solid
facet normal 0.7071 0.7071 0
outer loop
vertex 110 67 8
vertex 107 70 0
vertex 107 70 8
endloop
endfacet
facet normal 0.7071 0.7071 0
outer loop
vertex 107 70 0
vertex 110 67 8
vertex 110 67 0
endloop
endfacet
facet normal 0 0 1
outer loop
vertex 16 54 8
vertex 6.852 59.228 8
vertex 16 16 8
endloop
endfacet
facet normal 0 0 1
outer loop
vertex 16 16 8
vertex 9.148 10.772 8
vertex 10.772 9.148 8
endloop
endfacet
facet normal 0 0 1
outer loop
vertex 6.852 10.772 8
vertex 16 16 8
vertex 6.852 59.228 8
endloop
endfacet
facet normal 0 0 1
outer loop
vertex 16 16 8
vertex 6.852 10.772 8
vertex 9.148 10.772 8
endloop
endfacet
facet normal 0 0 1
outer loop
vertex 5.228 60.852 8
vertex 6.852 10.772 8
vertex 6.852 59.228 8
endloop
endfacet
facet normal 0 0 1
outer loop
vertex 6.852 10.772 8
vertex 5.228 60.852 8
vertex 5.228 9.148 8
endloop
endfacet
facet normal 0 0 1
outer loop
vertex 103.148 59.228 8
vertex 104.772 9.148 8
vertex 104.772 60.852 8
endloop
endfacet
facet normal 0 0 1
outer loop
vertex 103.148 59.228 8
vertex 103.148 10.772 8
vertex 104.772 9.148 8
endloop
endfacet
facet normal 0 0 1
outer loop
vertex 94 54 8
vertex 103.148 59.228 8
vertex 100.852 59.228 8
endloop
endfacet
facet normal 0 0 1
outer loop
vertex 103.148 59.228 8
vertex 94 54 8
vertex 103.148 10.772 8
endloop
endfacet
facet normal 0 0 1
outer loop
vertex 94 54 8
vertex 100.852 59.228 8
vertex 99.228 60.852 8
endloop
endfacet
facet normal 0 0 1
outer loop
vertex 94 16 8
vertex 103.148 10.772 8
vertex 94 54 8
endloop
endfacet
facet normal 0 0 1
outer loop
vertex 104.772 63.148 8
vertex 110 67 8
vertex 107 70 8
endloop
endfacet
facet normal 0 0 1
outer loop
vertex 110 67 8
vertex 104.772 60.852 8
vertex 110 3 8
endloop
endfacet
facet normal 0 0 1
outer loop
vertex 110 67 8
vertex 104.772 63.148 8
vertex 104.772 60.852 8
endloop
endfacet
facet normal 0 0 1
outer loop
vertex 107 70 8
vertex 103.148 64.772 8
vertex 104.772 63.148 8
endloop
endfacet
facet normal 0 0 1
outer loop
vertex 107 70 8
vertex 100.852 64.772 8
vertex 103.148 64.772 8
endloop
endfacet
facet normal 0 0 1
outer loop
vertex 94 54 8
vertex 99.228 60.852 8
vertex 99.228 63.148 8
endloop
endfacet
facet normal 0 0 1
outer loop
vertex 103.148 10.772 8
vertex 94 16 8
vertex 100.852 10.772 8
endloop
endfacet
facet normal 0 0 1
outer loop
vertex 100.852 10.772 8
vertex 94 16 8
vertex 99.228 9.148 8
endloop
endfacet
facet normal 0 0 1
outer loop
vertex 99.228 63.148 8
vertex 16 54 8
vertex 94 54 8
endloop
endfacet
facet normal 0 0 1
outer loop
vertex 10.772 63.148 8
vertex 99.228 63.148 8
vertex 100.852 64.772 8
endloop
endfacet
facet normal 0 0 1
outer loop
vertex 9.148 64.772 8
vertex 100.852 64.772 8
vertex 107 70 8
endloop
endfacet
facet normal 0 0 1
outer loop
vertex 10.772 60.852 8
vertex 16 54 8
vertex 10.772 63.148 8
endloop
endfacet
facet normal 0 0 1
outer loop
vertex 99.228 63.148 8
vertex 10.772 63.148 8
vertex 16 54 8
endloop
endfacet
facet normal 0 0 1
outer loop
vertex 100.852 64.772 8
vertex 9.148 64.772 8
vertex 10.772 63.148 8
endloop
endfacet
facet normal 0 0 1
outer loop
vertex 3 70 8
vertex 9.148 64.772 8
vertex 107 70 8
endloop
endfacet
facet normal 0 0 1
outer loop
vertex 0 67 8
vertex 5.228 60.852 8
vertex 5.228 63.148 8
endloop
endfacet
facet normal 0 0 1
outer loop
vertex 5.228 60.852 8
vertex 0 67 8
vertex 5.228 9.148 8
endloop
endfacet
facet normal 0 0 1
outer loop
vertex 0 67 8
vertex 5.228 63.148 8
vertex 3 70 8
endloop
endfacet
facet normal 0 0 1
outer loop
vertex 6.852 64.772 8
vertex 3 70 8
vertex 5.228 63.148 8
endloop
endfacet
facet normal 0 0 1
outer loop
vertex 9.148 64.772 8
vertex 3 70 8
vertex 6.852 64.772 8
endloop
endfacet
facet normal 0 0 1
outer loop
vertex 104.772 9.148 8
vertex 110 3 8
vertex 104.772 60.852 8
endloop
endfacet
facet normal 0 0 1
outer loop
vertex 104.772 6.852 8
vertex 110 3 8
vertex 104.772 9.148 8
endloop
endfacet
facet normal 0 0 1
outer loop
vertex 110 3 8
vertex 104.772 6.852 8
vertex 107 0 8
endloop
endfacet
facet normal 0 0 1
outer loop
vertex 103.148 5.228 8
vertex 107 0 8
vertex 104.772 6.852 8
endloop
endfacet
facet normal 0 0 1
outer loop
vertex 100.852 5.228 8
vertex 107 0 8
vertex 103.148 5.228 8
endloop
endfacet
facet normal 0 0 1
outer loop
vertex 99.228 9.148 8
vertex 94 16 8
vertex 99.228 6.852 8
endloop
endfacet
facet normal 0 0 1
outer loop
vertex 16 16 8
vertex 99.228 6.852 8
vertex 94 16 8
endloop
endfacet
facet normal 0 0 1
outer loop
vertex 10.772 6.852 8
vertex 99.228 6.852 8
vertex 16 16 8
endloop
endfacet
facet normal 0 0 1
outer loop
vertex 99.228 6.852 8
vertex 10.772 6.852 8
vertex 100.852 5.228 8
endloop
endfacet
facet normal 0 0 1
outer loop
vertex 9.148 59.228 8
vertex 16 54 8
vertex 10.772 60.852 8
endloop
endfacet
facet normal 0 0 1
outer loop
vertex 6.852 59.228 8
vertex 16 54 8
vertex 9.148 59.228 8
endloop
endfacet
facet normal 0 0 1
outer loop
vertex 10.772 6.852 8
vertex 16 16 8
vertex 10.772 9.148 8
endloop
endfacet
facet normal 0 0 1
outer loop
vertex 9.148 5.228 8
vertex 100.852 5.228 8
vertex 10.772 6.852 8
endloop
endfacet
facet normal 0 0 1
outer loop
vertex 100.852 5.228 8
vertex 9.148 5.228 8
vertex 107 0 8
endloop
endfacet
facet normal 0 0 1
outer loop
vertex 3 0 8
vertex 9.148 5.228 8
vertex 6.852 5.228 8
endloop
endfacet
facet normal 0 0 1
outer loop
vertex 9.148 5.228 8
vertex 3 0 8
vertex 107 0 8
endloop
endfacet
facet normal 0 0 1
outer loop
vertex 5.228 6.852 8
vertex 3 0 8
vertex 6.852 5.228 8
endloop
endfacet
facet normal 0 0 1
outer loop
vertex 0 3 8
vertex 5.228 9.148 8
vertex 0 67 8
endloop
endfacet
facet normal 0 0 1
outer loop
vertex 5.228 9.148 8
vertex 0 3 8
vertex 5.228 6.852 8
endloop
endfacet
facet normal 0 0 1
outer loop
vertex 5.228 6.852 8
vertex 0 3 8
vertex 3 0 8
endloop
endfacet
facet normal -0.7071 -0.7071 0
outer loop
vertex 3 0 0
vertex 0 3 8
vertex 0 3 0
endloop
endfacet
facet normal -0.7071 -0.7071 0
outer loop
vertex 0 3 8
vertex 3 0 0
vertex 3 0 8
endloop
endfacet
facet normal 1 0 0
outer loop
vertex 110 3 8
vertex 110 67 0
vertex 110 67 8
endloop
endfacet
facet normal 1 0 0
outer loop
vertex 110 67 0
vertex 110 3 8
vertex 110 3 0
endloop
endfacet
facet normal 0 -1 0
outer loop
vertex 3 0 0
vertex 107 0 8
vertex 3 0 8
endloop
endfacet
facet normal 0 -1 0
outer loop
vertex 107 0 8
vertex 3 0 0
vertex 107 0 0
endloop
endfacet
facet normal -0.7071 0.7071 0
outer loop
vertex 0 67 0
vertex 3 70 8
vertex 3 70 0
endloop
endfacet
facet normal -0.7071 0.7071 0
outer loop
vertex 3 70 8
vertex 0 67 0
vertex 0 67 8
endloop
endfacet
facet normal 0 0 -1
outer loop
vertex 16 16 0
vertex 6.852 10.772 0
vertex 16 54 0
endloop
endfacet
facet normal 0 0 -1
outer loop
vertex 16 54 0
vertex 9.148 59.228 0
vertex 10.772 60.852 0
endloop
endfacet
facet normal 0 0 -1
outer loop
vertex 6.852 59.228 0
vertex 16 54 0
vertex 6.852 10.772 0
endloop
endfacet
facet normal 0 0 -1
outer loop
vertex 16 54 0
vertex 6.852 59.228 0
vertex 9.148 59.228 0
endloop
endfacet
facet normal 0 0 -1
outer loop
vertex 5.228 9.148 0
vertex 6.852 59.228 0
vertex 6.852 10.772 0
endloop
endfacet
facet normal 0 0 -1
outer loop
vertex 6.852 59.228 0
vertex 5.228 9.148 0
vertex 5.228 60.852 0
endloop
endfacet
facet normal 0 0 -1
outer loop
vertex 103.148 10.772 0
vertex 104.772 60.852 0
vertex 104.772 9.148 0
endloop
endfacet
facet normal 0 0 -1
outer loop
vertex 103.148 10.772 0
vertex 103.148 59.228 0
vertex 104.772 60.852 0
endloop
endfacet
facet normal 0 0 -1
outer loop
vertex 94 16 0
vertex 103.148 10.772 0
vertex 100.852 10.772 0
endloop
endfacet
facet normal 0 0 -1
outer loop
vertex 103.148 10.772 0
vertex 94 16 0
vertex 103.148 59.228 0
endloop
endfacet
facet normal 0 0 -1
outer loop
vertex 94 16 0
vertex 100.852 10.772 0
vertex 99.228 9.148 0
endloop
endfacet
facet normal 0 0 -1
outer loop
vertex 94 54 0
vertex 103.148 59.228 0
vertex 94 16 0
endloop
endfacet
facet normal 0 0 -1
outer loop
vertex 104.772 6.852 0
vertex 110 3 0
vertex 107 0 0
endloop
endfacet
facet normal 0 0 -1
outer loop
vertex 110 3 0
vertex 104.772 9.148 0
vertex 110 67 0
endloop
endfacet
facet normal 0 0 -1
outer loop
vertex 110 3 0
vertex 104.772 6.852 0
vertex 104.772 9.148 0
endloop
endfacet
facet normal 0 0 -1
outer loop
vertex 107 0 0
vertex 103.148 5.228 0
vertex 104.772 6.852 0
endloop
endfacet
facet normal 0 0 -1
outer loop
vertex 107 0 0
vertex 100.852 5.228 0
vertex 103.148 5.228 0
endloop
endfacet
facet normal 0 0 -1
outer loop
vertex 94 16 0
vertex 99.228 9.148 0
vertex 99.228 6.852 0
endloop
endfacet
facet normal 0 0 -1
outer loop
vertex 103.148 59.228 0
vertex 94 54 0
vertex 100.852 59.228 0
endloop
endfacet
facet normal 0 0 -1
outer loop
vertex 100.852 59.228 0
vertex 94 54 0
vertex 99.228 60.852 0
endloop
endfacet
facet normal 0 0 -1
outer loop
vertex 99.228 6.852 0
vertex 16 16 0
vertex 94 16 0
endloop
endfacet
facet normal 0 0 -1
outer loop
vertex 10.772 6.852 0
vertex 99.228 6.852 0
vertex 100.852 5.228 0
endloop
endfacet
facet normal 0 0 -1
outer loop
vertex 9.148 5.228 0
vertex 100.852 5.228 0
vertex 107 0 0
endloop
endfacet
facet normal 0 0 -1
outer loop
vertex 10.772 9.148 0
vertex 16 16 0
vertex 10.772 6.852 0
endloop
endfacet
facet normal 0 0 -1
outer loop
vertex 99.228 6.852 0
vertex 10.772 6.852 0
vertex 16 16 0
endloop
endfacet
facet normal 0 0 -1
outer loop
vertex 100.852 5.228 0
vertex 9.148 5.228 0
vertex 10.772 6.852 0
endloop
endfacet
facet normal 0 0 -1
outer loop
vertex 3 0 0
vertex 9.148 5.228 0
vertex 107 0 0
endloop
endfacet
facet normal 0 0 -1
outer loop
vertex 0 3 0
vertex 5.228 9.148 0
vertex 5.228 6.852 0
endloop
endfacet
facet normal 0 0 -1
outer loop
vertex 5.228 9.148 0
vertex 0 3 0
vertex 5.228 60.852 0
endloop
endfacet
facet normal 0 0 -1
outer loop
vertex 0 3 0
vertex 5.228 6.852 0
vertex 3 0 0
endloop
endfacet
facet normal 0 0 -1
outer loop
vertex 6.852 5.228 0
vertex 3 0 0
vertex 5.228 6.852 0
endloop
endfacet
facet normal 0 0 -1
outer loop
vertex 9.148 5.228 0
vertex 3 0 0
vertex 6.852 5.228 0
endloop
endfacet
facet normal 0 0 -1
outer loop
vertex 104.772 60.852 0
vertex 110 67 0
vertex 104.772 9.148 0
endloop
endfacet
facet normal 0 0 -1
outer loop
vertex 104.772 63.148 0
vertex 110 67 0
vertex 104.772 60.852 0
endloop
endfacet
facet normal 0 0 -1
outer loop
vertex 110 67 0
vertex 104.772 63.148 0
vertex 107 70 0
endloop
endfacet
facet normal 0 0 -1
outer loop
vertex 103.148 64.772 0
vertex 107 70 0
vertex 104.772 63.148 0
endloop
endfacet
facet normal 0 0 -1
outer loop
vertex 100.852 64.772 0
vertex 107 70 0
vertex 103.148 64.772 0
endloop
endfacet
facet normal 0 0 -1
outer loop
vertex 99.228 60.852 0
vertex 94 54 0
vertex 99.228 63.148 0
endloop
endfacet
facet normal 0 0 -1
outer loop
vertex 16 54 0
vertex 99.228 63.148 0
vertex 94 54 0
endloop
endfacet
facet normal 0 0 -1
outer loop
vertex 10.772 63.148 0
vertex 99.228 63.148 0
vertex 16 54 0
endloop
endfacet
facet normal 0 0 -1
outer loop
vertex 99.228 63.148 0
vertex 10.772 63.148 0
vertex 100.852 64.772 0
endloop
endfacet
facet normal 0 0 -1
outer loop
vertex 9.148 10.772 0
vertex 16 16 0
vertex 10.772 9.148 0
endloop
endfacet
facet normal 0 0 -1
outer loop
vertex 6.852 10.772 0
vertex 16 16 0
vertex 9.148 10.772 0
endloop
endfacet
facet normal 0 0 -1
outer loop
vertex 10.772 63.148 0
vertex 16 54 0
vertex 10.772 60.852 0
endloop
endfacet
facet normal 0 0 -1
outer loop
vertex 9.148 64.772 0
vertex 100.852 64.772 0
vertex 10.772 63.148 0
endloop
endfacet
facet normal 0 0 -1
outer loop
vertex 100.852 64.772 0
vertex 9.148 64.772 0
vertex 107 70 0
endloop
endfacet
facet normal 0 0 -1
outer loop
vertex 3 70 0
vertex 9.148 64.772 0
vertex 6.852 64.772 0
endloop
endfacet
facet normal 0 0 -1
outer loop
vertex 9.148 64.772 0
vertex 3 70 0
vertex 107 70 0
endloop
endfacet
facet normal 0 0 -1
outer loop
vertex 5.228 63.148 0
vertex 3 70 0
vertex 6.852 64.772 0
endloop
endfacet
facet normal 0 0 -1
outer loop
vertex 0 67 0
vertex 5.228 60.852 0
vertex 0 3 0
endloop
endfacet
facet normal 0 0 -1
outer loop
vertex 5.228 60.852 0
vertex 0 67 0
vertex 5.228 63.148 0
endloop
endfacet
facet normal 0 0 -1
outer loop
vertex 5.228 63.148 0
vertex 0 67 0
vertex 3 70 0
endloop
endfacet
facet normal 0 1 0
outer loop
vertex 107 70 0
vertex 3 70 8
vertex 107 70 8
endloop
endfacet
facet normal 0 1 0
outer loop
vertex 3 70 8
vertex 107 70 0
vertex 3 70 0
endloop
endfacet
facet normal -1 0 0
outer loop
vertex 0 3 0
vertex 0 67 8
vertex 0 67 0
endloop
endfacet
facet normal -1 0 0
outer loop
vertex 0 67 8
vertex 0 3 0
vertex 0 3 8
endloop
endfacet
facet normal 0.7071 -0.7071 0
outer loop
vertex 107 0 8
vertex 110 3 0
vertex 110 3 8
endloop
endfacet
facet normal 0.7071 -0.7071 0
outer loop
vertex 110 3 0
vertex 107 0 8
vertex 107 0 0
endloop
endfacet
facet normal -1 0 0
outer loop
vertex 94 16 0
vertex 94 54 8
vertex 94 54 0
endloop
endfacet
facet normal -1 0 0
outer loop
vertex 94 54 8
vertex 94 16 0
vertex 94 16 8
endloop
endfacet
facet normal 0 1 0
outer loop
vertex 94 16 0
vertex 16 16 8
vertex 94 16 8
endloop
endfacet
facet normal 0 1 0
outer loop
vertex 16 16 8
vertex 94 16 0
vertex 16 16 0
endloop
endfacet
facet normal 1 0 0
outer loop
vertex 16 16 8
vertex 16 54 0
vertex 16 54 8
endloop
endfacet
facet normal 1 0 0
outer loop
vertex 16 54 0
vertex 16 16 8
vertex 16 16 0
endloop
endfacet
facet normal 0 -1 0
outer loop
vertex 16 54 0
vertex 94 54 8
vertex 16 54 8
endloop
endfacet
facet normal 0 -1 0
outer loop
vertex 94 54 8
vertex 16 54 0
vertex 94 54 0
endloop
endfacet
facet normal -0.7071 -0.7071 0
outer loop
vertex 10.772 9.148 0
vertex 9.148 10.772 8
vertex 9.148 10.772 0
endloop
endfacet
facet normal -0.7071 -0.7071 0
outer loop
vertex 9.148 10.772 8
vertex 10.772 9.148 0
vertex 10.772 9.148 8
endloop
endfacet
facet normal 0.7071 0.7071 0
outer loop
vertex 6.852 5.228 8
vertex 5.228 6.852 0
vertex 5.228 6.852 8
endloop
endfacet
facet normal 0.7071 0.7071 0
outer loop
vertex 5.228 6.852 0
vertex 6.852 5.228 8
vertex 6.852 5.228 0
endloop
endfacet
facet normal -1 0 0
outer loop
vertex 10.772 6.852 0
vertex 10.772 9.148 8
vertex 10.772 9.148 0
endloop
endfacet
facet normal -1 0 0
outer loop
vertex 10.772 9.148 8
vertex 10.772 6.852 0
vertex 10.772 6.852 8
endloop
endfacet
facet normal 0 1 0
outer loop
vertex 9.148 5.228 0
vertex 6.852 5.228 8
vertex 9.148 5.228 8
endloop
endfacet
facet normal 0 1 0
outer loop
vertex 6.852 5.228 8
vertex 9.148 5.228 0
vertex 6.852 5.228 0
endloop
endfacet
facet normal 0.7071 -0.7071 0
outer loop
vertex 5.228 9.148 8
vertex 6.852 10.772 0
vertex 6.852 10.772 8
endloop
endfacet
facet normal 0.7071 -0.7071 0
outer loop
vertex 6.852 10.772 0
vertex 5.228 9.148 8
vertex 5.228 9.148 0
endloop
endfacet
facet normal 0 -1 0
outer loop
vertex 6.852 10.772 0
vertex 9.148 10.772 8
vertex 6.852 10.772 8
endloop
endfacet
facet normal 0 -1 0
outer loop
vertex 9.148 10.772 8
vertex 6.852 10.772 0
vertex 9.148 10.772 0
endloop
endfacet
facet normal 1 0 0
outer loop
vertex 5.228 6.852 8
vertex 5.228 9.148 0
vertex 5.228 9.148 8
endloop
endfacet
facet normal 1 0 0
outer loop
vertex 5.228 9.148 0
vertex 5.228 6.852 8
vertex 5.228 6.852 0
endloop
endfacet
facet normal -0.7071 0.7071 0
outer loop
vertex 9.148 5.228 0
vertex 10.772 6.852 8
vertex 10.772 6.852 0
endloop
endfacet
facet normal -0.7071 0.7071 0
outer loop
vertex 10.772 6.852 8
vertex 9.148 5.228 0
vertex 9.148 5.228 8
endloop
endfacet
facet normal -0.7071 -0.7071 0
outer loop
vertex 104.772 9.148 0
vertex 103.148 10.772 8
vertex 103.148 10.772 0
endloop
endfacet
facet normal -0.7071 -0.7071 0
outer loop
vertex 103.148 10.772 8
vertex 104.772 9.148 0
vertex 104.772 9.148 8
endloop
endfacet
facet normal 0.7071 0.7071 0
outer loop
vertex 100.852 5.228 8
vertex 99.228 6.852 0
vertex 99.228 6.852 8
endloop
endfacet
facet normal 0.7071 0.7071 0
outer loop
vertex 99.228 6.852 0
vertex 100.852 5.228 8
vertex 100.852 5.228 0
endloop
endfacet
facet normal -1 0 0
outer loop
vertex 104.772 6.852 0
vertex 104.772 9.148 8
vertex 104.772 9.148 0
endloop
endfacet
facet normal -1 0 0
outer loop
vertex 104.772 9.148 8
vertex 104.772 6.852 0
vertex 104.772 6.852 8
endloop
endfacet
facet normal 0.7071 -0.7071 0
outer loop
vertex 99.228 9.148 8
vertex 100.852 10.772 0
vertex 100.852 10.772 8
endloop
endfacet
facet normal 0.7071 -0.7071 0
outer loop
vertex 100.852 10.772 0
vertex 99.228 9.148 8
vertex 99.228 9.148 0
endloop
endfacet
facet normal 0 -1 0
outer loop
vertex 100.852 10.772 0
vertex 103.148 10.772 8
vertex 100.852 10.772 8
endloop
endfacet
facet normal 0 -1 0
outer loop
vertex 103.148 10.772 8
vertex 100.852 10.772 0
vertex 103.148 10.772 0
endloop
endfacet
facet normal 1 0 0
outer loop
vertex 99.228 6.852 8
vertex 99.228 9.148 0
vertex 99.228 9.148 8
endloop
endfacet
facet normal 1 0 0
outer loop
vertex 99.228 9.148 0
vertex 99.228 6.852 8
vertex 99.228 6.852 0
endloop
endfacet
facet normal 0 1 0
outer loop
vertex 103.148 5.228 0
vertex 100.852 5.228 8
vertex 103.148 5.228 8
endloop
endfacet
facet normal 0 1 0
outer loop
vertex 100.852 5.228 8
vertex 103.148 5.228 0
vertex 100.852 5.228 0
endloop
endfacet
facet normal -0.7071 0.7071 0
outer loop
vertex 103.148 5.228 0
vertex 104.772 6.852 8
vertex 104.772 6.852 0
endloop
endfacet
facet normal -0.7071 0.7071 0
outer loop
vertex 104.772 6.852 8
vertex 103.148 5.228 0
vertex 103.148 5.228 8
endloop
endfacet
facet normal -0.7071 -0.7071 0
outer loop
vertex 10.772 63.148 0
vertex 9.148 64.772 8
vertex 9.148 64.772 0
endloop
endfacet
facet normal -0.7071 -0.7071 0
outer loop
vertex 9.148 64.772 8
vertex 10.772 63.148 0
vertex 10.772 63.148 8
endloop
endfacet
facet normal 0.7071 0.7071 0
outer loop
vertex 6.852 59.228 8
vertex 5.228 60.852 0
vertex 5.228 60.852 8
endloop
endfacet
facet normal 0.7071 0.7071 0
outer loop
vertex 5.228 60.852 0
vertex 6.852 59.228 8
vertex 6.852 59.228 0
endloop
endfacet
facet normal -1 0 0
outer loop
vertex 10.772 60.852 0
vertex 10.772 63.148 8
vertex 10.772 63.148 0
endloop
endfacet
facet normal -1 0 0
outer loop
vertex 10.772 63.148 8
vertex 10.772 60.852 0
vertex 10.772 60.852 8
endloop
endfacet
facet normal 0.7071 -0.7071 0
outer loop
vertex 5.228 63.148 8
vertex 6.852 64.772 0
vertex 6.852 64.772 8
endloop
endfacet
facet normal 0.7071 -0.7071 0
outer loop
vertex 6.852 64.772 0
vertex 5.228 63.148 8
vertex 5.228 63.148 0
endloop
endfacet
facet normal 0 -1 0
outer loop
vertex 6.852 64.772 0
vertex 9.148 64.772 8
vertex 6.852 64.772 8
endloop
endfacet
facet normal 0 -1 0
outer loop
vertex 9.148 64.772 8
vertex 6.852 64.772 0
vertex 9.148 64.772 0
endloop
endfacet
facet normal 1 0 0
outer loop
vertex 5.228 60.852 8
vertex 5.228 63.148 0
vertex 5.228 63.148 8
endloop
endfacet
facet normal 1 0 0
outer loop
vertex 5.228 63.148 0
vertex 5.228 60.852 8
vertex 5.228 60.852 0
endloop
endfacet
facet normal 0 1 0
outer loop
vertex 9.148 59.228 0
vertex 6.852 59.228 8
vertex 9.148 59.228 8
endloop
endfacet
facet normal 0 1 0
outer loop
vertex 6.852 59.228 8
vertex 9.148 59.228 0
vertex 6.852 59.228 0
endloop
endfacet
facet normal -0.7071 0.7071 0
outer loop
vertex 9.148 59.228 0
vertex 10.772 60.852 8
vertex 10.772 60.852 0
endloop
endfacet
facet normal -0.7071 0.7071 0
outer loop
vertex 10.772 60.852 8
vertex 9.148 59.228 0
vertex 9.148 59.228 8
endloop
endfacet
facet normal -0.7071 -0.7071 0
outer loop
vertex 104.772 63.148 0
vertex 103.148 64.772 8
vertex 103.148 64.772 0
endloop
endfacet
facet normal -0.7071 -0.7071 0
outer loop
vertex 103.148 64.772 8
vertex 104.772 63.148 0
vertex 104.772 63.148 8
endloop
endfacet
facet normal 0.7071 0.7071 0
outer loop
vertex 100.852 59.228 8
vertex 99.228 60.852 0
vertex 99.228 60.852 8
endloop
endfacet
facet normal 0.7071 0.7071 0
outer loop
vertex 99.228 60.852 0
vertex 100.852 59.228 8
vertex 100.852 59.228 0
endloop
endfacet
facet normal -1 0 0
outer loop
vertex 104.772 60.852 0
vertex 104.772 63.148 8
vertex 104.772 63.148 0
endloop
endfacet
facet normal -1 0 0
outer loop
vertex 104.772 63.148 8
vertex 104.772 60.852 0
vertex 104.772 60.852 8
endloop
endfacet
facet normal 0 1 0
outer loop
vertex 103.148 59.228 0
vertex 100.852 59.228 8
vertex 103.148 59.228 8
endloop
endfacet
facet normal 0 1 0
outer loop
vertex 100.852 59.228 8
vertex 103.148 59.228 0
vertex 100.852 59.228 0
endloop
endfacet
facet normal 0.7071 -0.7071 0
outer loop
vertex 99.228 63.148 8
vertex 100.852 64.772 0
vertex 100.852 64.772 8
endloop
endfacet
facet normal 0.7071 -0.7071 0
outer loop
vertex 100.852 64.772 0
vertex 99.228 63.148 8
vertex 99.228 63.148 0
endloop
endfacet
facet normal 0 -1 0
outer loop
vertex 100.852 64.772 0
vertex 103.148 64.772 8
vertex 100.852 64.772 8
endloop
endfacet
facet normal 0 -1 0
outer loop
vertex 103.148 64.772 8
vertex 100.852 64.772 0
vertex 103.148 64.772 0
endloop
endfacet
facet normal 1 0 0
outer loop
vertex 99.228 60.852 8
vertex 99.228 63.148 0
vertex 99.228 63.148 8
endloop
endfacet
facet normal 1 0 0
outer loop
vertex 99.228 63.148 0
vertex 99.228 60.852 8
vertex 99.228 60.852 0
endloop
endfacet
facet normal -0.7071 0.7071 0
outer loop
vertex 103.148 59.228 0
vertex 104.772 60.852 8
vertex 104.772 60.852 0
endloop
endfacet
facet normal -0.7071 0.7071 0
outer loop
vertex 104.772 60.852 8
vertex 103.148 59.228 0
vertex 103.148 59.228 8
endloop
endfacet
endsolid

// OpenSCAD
$fn = 32;

// ----------------------------------------------------------------------
// Frame plate: 110 x 70 frame, 16 mm rails
// ----------------------------------------------------------------------

// --- parameters (mm) ---
plate_l = 110;            // plate length, X
plate_w = 70;             // plate width, Y
plate_t = 8;              // plate thickness, Z (extrusion height)
corner_c = 3;             // corner chamfer
frame_bar = 16;           // frame rail width
bolt_r = 3;               // corner bolt window radius
bolt_inset = 8;           // bolt centre inset from the edges

win_l = plate_l - 2 * frame_bar;  // window length
win_w = plate_w - 2 * frame_bar;  // window width
bolt_d = 2 * bolt_r;  // corner hole diameter

profile = [[3, 0], [107, 0], [110, 3], [110, 67], [107, 70], [3, 70], [0, 67], [0, 3]];  // primary outline, 8 points, counter clockwise
void_1 = [[16, 16], [94, 16], [94, 54], [16, 54]];  // the window, 4 points
void_2 = [[10.772, 9.148], [9.148, 10.772], [6.852, 10.772], [5.228, 9.148], [5.228, 6.852], [6.852, 5.228], [9.148, 5.228], [10.772, 6.852]];  // corner bolt window, 8 points
void_3 = [[104.772, 9.148], [103.148, 10.772], [100.852, 10.772], [99.228, 9.148], [99.228, 6.852], [100.852, 5.228], [103.148, 5.228], [104.772, 6.852]];  // corner bolt window, 8 points
void_4 = [[10.772, 63.148], [9.148, 64.772], [6.852, 64.772], [5.228, 63.148], [5.228, 60.852], [6.852, 59.228], [9.148, 59.228], [10.772, 60.852]];  // corner bolt window, 8 points
void_5 = [[104.772, 63.148], [103.148, 64.772], [100.852, 64.772], [99.228, 63.148], [99.228, 60.852], [100.852, 59.228], [103.148, 59.228], [104.772, 60.852]];  // corner bolt window, 8 points

// --- the one profile operation ---
difference() {
  linear_extrude(height = plate_t) polygon(points = profile);
  translate([0, 0, -1])
    linear_extrude(height = plate_t + 2) polygon(points = void_1);
  translate([0, 0, -1])
    linear_extrude(height = plate_t + 2) polygon(points = void_2);
  translate([0, 0, -1])
    linear_extrude(height = plate_t + 2) polygon(points = void_3);
  translate([0, 0, -1])
    linear_extrude(height = plate_t + 2) polygon(points = void_4);
  translate([0, 0, -1])
    linear_extrude(height = plate_t + 2) polygon(points = void_5);
}
